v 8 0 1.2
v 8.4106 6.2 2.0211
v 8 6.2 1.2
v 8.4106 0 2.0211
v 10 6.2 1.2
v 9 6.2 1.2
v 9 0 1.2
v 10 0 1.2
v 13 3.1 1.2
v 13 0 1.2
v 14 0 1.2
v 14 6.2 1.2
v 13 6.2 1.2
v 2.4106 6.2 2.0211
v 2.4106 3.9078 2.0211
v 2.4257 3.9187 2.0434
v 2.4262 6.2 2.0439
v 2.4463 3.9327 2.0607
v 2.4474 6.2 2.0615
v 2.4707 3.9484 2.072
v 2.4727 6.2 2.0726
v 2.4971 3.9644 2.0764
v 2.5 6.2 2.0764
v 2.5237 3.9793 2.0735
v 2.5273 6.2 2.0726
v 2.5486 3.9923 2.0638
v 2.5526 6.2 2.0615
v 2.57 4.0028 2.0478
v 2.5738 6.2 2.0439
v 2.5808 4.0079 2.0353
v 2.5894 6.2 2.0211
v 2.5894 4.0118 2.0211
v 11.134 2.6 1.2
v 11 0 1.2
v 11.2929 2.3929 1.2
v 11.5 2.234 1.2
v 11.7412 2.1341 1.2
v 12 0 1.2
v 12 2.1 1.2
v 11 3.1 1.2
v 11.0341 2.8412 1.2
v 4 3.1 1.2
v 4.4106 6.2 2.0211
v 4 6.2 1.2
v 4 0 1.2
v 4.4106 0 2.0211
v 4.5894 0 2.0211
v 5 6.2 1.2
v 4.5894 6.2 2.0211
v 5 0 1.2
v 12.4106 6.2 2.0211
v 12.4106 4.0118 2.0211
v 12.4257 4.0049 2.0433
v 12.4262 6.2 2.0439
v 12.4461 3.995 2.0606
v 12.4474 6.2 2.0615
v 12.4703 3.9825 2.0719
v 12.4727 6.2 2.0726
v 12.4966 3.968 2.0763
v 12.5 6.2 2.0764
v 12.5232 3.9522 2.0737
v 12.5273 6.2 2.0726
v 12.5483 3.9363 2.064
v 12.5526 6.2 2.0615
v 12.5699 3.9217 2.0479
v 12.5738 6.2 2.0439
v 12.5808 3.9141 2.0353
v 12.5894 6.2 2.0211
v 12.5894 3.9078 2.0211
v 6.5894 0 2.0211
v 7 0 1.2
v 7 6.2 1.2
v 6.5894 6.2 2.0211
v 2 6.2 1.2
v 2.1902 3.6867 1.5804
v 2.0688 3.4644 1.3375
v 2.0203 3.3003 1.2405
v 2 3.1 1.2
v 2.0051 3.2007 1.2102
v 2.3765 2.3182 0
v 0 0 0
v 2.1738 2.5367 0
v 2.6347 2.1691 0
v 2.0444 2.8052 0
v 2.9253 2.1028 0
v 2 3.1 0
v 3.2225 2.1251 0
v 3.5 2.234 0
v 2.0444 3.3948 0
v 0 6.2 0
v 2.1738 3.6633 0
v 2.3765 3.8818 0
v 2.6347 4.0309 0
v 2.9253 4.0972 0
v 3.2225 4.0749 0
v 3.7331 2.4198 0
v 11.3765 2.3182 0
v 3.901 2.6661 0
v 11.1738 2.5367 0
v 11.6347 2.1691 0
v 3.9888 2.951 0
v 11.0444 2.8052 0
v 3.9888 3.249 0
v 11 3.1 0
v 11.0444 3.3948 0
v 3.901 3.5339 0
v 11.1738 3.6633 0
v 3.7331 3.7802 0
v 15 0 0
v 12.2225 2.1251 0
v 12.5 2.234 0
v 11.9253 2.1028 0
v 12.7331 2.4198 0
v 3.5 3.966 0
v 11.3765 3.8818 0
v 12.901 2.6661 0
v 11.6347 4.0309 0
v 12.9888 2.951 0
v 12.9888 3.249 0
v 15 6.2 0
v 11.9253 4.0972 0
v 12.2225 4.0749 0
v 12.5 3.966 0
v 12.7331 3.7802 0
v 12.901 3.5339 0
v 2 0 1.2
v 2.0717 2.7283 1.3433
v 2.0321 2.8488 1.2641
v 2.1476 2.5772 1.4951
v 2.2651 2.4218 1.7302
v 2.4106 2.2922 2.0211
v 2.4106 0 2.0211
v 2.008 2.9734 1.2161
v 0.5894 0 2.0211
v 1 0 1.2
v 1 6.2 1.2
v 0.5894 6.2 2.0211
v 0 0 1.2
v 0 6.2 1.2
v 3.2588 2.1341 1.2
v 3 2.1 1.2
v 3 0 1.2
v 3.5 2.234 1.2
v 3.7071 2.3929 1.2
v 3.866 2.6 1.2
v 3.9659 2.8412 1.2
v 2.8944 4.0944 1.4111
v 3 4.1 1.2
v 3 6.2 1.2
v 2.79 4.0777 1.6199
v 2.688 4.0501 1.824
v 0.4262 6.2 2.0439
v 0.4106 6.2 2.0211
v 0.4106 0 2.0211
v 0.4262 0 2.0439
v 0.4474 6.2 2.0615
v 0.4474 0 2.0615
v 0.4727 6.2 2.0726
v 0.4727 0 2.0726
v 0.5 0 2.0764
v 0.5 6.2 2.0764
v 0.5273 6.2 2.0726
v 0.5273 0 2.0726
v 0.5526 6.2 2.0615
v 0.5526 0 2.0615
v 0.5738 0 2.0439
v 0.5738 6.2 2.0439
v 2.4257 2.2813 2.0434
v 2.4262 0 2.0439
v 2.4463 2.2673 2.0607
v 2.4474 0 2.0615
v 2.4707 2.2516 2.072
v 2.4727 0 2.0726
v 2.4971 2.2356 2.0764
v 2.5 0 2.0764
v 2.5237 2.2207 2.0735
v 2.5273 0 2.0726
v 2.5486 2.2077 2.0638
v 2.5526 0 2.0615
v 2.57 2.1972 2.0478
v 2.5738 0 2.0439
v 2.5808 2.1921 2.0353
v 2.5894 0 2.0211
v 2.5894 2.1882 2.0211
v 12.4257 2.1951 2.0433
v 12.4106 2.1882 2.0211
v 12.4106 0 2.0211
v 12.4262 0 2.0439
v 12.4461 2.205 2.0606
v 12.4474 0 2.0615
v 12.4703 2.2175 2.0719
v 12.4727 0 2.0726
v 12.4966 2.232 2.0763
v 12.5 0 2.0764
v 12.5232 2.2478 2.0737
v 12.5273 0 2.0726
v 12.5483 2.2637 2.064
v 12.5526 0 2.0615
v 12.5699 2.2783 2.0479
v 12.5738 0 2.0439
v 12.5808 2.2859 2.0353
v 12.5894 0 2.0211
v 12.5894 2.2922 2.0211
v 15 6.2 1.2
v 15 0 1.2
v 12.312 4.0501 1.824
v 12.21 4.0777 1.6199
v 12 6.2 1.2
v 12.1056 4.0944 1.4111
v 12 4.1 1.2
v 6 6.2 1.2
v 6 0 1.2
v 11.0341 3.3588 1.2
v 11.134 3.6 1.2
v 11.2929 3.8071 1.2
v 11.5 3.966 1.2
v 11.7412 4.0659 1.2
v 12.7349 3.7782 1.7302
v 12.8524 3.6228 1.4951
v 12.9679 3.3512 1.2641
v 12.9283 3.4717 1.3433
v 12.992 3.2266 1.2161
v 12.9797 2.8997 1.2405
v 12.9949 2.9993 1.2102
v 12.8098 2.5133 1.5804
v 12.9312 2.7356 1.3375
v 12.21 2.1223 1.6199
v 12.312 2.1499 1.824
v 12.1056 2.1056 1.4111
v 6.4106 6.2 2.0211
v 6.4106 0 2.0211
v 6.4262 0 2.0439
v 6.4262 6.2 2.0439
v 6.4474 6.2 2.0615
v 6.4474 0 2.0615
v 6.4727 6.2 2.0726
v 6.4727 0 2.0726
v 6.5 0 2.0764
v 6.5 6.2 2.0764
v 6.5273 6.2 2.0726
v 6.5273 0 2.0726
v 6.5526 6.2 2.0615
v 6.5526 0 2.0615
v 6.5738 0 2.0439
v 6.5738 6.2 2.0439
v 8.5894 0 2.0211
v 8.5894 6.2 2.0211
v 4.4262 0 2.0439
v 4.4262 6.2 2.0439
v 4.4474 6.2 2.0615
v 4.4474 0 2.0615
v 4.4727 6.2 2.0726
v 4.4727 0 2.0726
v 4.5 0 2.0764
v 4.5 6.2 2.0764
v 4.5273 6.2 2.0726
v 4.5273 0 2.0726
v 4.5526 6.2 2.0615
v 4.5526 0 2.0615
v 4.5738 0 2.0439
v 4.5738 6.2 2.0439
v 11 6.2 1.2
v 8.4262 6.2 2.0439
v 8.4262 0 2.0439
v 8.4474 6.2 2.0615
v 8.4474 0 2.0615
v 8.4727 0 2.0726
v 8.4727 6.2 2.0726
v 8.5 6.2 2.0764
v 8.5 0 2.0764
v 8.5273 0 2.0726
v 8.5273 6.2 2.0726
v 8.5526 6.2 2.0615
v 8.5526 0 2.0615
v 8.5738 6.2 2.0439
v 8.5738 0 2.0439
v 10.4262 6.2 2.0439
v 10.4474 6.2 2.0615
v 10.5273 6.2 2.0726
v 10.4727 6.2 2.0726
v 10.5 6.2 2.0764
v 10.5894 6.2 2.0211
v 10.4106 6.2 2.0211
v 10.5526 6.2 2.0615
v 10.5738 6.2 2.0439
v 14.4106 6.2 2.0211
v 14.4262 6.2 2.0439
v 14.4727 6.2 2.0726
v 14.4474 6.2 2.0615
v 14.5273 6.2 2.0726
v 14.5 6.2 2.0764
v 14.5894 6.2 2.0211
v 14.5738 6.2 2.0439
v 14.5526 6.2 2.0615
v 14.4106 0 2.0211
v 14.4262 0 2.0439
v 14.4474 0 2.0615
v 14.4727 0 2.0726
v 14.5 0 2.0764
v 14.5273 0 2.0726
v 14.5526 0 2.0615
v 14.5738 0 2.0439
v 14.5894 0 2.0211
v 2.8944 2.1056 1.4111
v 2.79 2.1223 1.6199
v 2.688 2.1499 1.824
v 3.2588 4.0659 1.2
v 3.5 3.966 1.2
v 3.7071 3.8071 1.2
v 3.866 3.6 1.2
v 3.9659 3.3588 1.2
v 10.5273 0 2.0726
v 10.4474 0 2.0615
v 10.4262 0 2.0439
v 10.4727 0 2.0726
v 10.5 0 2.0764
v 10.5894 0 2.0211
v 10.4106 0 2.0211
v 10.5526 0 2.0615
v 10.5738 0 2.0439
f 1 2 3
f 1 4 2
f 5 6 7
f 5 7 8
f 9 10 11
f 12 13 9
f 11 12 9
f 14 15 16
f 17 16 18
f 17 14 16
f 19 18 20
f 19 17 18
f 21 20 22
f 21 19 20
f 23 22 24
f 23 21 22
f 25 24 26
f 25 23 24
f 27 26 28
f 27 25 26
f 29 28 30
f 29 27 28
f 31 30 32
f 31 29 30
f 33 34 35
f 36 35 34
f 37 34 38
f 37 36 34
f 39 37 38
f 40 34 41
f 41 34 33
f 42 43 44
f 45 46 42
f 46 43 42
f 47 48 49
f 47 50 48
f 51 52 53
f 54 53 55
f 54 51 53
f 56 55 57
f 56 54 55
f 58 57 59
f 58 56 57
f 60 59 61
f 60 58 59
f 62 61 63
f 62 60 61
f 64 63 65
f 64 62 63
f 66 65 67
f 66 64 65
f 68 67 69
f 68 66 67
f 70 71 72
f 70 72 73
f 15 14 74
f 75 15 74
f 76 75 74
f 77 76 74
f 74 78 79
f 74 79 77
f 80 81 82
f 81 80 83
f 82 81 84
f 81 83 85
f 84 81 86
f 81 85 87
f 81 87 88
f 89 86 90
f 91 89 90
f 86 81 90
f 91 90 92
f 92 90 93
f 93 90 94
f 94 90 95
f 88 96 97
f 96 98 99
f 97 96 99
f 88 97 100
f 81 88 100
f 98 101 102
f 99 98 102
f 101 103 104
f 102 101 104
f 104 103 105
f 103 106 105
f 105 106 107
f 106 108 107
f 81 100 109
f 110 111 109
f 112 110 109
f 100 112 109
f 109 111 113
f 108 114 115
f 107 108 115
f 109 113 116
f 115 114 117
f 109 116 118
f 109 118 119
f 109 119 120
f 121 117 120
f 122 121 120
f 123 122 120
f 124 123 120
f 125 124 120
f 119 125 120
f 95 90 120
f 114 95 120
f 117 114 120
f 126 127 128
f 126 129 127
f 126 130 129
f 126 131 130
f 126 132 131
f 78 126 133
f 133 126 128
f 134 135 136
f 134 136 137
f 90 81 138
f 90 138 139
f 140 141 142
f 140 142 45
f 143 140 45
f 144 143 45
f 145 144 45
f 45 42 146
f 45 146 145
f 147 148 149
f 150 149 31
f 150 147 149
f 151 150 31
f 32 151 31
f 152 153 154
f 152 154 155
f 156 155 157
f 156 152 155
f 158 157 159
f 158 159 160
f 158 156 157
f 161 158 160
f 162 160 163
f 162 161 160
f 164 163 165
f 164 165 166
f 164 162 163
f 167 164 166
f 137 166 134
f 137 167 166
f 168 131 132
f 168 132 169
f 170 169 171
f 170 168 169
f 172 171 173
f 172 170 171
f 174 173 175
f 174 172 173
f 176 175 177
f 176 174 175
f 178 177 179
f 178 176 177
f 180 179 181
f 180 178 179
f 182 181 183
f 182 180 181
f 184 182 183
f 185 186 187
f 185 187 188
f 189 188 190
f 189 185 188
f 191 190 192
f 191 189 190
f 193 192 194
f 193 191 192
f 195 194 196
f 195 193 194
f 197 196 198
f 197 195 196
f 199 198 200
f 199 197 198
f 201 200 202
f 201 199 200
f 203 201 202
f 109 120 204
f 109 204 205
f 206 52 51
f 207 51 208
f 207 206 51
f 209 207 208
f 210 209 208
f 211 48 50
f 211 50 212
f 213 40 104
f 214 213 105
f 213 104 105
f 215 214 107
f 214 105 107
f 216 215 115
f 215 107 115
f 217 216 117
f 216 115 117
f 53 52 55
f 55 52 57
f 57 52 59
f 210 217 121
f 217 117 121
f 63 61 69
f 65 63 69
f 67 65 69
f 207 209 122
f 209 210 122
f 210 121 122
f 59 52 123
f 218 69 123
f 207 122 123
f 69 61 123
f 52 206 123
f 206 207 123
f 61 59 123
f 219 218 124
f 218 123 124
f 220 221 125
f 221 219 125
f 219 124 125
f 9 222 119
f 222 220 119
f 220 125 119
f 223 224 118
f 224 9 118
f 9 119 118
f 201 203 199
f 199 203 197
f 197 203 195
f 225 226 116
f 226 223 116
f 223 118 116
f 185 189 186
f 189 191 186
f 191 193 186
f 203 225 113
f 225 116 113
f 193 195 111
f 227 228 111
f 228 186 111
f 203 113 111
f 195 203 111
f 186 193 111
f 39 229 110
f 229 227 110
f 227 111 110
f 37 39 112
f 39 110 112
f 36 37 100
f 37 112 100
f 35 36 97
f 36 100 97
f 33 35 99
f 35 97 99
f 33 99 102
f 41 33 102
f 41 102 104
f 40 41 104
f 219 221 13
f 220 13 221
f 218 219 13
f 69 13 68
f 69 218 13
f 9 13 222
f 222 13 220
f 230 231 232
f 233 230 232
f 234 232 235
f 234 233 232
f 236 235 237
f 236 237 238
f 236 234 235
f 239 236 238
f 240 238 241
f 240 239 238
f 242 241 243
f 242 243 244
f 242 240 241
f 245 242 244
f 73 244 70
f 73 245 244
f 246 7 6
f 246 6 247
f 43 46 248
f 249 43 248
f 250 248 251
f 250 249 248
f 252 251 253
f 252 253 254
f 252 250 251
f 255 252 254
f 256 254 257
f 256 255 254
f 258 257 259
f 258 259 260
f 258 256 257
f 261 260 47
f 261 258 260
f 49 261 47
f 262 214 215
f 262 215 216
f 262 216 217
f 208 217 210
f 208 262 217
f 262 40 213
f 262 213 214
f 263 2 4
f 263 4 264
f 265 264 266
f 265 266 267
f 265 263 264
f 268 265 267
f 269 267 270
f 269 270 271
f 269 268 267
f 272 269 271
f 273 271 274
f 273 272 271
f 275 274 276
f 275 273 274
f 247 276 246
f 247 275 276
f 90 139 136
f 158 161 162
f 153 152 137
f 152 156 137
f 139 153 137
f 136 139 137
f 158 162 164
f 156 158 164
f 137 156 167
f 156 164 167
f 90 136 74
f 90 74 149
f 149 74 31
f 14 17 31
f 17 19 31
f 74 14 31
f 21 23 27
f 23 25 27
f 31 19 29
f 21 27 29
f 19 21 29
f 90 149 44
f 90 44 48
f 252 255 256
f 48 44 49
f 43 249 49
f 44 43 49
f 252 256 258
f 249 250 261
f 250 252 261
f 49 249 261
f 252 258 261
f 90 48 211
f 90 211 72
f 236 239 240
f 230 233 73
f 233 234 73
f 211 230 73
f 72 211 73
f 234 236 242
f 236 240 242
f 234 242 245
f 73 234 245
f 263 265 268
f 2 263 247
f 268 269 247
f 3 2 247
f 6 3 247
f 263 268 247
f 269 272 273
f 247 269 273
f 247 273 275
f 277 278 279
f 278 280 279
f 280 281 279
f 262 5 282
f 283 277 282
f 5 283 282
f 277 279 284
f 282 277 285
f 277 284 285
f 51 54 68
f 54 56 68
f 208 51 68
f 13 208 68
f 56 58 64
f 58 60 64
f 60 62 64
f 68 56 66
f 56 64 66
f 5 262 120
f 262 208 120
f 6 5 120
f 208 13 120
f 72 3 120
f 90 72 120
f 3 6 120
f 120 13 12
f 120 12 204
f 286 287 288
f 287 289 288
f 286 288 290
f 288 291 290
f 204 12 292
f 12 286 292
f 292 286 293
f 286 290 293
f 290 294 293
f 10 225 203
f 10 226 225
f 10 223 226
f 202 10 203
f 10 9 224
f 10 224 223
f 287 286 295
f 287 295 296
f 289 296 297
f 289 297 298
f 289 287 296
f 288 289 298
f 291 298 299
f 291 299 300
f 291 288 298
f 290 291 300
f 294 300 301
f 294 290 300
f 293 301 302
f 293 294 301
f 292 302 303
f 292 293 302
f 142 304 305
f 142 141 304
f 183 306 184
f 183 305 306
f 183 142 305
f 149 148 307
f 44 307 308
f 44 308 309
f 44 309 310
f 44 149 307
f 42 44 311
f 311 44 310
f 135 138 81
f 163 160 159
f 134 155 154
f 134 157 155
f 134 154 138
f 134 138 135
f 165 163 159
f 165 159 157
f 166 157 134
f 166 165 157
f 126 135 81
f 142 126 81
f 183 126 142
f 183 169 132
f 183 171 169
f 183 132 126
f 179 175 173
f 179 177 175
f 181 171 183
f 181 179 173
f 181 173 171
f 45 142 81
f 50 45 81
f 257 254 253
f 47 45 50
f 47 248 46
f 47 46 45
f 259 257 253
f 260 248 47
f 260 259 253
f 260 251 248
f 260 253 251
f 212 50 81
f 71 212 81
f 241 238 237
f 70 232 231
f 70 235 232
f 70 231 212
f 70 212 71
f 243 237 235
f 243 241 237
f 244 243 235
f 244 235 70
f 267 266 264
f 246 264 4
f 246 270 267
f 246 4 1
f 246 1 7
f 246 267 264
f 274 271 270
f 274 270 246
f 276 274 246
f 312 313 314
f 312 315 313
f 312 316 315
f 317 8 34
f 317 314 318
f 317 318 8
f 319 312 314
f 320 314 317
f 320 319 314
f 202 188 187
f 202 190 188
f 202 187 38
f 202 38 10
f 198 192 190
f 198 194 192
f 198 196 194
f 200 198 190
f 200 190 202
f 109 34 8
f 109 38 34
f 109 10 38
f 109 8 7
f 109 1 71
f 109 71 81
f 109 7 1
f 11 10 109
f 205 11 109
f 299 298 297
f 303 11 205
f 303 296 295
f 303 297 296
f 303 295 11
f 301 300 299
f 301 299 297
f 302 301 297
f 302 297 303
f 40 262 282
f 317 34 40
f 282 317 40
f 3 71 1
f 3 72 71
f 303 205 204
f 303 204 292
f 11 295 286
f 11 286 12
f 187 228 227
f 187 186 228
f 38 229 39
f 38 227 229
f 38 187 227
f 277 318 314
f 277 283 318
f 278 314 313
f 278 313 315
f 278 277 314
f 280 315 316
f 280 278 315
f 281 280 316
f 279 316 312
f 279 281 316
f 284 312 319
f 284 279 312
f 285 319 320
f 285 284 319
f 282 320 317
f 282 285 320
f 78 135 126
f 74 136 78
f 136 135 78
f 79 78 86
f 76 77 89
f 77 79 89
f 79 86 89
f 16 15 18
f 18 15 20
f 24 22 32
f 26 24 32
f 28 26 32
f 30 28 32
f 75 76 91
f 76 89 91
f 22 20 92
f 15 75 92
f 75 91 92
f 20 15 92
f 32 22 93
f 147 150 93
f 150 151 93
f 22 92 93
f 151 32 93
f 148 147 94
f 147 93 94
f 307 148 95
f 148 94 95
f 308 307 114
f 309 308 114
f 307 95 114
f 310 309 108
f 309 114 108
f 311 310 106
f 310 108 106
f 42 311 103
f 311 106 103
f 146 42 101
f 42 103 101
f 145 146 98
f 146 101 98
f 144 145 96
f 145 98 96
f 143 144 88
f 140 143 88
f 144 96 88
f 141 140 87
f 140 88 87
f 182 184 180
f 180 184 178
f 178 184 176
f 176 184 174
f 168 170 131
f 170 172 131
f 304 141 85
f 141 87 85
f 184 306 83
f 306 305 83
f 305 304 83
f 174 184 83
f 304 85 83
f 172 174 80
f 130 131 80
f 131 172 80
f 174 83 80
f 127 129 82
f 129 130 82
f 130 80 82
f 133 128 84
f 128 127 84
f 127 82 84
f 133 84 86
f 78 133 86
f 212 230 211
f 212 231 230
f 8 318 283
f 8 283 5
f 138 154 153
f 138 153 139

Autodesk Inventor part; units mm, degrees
ref_plane "YZ Plane" through (0, 0, 0) normal (1, 0, 0) x (0, 1, 0)
ref_plane "XZ Plane" through (0, 0, 0) normal (0, 1, 0) x (-1, 0, 0)
ref_plane "XY Plane" through (0, 0, 0) normal (0, 0, 1) x (1, 0, 0)
sketch "Sketch1" plane through (0, 0, 0) normal (0, 0, 1) x (1, 0, 0)
  line L0 (0, 0) -> (0, 6.2)
  line L1 (0, 6.2) -> (15, 6.2)
  line L2 (15, 6.2) -> (15, 0)
  line L3 (15, 0) -> (0, 0)
  dimension "d0" = 6.2
  dimension "d1" = 15
extrude "Extrusion1" add sketch "Sketch1" along normal blind 1.2
sketch "Sketch2" plane through (0, 0, 0) normal (0, -1, 0) x (1, 0, 0)
  line L0 (0, 0) -> (0, 1.2) projected
  line L1 (0, 1.2) -> (0.5, 1.2)
  line L2 (15, 1.2) -> (0, 1.2) projected
  line L3 (0.5, 1.2) -> (0.5, 2.2)
  line L4 (0.5, 2.2) -> (0, 1.2)
  line L5 (0.5, 1.2) -> (1, 1.2)
  line L6 (1, 1.2) -> (0.5, 2.2)
  dimension "d4" = 0.5
  dimension "d5" = 1
  dimension "d6" = 0.5
extrude "Extrusion2" add sketch "Sketch2" against normal blind 6.2
fillet "Fillet1" radius 0.1 1 edges at (0.5, 3.1, 2.2)
pattern_linear "Rectangular Pattern1" count 8 spacing 2 along (1, 0, 0) of "Fillet1", "Extrusion2"
sketch "Sketch3" plane through (0, 0, 0) normal (0, 0, -1) x (-1, 0, 0)
  circle A0 centre (-3, 3.1) radius 1
  circle A1 centre (-12, 3.1) radius 1
  line L0 (0, 6.2) -> (0, 0) projected
  line L1 (-15, 0) -> (-15, 6.2) projected
  dimension "d13" = 2
  dimension "d14" = 2
  dimension "d15" = 3
  dimension "d16" = 3
extrude "Extrusion3" cut sketch "Sketch3" against normal blind 6.2
properties part number "time belt coupling"
